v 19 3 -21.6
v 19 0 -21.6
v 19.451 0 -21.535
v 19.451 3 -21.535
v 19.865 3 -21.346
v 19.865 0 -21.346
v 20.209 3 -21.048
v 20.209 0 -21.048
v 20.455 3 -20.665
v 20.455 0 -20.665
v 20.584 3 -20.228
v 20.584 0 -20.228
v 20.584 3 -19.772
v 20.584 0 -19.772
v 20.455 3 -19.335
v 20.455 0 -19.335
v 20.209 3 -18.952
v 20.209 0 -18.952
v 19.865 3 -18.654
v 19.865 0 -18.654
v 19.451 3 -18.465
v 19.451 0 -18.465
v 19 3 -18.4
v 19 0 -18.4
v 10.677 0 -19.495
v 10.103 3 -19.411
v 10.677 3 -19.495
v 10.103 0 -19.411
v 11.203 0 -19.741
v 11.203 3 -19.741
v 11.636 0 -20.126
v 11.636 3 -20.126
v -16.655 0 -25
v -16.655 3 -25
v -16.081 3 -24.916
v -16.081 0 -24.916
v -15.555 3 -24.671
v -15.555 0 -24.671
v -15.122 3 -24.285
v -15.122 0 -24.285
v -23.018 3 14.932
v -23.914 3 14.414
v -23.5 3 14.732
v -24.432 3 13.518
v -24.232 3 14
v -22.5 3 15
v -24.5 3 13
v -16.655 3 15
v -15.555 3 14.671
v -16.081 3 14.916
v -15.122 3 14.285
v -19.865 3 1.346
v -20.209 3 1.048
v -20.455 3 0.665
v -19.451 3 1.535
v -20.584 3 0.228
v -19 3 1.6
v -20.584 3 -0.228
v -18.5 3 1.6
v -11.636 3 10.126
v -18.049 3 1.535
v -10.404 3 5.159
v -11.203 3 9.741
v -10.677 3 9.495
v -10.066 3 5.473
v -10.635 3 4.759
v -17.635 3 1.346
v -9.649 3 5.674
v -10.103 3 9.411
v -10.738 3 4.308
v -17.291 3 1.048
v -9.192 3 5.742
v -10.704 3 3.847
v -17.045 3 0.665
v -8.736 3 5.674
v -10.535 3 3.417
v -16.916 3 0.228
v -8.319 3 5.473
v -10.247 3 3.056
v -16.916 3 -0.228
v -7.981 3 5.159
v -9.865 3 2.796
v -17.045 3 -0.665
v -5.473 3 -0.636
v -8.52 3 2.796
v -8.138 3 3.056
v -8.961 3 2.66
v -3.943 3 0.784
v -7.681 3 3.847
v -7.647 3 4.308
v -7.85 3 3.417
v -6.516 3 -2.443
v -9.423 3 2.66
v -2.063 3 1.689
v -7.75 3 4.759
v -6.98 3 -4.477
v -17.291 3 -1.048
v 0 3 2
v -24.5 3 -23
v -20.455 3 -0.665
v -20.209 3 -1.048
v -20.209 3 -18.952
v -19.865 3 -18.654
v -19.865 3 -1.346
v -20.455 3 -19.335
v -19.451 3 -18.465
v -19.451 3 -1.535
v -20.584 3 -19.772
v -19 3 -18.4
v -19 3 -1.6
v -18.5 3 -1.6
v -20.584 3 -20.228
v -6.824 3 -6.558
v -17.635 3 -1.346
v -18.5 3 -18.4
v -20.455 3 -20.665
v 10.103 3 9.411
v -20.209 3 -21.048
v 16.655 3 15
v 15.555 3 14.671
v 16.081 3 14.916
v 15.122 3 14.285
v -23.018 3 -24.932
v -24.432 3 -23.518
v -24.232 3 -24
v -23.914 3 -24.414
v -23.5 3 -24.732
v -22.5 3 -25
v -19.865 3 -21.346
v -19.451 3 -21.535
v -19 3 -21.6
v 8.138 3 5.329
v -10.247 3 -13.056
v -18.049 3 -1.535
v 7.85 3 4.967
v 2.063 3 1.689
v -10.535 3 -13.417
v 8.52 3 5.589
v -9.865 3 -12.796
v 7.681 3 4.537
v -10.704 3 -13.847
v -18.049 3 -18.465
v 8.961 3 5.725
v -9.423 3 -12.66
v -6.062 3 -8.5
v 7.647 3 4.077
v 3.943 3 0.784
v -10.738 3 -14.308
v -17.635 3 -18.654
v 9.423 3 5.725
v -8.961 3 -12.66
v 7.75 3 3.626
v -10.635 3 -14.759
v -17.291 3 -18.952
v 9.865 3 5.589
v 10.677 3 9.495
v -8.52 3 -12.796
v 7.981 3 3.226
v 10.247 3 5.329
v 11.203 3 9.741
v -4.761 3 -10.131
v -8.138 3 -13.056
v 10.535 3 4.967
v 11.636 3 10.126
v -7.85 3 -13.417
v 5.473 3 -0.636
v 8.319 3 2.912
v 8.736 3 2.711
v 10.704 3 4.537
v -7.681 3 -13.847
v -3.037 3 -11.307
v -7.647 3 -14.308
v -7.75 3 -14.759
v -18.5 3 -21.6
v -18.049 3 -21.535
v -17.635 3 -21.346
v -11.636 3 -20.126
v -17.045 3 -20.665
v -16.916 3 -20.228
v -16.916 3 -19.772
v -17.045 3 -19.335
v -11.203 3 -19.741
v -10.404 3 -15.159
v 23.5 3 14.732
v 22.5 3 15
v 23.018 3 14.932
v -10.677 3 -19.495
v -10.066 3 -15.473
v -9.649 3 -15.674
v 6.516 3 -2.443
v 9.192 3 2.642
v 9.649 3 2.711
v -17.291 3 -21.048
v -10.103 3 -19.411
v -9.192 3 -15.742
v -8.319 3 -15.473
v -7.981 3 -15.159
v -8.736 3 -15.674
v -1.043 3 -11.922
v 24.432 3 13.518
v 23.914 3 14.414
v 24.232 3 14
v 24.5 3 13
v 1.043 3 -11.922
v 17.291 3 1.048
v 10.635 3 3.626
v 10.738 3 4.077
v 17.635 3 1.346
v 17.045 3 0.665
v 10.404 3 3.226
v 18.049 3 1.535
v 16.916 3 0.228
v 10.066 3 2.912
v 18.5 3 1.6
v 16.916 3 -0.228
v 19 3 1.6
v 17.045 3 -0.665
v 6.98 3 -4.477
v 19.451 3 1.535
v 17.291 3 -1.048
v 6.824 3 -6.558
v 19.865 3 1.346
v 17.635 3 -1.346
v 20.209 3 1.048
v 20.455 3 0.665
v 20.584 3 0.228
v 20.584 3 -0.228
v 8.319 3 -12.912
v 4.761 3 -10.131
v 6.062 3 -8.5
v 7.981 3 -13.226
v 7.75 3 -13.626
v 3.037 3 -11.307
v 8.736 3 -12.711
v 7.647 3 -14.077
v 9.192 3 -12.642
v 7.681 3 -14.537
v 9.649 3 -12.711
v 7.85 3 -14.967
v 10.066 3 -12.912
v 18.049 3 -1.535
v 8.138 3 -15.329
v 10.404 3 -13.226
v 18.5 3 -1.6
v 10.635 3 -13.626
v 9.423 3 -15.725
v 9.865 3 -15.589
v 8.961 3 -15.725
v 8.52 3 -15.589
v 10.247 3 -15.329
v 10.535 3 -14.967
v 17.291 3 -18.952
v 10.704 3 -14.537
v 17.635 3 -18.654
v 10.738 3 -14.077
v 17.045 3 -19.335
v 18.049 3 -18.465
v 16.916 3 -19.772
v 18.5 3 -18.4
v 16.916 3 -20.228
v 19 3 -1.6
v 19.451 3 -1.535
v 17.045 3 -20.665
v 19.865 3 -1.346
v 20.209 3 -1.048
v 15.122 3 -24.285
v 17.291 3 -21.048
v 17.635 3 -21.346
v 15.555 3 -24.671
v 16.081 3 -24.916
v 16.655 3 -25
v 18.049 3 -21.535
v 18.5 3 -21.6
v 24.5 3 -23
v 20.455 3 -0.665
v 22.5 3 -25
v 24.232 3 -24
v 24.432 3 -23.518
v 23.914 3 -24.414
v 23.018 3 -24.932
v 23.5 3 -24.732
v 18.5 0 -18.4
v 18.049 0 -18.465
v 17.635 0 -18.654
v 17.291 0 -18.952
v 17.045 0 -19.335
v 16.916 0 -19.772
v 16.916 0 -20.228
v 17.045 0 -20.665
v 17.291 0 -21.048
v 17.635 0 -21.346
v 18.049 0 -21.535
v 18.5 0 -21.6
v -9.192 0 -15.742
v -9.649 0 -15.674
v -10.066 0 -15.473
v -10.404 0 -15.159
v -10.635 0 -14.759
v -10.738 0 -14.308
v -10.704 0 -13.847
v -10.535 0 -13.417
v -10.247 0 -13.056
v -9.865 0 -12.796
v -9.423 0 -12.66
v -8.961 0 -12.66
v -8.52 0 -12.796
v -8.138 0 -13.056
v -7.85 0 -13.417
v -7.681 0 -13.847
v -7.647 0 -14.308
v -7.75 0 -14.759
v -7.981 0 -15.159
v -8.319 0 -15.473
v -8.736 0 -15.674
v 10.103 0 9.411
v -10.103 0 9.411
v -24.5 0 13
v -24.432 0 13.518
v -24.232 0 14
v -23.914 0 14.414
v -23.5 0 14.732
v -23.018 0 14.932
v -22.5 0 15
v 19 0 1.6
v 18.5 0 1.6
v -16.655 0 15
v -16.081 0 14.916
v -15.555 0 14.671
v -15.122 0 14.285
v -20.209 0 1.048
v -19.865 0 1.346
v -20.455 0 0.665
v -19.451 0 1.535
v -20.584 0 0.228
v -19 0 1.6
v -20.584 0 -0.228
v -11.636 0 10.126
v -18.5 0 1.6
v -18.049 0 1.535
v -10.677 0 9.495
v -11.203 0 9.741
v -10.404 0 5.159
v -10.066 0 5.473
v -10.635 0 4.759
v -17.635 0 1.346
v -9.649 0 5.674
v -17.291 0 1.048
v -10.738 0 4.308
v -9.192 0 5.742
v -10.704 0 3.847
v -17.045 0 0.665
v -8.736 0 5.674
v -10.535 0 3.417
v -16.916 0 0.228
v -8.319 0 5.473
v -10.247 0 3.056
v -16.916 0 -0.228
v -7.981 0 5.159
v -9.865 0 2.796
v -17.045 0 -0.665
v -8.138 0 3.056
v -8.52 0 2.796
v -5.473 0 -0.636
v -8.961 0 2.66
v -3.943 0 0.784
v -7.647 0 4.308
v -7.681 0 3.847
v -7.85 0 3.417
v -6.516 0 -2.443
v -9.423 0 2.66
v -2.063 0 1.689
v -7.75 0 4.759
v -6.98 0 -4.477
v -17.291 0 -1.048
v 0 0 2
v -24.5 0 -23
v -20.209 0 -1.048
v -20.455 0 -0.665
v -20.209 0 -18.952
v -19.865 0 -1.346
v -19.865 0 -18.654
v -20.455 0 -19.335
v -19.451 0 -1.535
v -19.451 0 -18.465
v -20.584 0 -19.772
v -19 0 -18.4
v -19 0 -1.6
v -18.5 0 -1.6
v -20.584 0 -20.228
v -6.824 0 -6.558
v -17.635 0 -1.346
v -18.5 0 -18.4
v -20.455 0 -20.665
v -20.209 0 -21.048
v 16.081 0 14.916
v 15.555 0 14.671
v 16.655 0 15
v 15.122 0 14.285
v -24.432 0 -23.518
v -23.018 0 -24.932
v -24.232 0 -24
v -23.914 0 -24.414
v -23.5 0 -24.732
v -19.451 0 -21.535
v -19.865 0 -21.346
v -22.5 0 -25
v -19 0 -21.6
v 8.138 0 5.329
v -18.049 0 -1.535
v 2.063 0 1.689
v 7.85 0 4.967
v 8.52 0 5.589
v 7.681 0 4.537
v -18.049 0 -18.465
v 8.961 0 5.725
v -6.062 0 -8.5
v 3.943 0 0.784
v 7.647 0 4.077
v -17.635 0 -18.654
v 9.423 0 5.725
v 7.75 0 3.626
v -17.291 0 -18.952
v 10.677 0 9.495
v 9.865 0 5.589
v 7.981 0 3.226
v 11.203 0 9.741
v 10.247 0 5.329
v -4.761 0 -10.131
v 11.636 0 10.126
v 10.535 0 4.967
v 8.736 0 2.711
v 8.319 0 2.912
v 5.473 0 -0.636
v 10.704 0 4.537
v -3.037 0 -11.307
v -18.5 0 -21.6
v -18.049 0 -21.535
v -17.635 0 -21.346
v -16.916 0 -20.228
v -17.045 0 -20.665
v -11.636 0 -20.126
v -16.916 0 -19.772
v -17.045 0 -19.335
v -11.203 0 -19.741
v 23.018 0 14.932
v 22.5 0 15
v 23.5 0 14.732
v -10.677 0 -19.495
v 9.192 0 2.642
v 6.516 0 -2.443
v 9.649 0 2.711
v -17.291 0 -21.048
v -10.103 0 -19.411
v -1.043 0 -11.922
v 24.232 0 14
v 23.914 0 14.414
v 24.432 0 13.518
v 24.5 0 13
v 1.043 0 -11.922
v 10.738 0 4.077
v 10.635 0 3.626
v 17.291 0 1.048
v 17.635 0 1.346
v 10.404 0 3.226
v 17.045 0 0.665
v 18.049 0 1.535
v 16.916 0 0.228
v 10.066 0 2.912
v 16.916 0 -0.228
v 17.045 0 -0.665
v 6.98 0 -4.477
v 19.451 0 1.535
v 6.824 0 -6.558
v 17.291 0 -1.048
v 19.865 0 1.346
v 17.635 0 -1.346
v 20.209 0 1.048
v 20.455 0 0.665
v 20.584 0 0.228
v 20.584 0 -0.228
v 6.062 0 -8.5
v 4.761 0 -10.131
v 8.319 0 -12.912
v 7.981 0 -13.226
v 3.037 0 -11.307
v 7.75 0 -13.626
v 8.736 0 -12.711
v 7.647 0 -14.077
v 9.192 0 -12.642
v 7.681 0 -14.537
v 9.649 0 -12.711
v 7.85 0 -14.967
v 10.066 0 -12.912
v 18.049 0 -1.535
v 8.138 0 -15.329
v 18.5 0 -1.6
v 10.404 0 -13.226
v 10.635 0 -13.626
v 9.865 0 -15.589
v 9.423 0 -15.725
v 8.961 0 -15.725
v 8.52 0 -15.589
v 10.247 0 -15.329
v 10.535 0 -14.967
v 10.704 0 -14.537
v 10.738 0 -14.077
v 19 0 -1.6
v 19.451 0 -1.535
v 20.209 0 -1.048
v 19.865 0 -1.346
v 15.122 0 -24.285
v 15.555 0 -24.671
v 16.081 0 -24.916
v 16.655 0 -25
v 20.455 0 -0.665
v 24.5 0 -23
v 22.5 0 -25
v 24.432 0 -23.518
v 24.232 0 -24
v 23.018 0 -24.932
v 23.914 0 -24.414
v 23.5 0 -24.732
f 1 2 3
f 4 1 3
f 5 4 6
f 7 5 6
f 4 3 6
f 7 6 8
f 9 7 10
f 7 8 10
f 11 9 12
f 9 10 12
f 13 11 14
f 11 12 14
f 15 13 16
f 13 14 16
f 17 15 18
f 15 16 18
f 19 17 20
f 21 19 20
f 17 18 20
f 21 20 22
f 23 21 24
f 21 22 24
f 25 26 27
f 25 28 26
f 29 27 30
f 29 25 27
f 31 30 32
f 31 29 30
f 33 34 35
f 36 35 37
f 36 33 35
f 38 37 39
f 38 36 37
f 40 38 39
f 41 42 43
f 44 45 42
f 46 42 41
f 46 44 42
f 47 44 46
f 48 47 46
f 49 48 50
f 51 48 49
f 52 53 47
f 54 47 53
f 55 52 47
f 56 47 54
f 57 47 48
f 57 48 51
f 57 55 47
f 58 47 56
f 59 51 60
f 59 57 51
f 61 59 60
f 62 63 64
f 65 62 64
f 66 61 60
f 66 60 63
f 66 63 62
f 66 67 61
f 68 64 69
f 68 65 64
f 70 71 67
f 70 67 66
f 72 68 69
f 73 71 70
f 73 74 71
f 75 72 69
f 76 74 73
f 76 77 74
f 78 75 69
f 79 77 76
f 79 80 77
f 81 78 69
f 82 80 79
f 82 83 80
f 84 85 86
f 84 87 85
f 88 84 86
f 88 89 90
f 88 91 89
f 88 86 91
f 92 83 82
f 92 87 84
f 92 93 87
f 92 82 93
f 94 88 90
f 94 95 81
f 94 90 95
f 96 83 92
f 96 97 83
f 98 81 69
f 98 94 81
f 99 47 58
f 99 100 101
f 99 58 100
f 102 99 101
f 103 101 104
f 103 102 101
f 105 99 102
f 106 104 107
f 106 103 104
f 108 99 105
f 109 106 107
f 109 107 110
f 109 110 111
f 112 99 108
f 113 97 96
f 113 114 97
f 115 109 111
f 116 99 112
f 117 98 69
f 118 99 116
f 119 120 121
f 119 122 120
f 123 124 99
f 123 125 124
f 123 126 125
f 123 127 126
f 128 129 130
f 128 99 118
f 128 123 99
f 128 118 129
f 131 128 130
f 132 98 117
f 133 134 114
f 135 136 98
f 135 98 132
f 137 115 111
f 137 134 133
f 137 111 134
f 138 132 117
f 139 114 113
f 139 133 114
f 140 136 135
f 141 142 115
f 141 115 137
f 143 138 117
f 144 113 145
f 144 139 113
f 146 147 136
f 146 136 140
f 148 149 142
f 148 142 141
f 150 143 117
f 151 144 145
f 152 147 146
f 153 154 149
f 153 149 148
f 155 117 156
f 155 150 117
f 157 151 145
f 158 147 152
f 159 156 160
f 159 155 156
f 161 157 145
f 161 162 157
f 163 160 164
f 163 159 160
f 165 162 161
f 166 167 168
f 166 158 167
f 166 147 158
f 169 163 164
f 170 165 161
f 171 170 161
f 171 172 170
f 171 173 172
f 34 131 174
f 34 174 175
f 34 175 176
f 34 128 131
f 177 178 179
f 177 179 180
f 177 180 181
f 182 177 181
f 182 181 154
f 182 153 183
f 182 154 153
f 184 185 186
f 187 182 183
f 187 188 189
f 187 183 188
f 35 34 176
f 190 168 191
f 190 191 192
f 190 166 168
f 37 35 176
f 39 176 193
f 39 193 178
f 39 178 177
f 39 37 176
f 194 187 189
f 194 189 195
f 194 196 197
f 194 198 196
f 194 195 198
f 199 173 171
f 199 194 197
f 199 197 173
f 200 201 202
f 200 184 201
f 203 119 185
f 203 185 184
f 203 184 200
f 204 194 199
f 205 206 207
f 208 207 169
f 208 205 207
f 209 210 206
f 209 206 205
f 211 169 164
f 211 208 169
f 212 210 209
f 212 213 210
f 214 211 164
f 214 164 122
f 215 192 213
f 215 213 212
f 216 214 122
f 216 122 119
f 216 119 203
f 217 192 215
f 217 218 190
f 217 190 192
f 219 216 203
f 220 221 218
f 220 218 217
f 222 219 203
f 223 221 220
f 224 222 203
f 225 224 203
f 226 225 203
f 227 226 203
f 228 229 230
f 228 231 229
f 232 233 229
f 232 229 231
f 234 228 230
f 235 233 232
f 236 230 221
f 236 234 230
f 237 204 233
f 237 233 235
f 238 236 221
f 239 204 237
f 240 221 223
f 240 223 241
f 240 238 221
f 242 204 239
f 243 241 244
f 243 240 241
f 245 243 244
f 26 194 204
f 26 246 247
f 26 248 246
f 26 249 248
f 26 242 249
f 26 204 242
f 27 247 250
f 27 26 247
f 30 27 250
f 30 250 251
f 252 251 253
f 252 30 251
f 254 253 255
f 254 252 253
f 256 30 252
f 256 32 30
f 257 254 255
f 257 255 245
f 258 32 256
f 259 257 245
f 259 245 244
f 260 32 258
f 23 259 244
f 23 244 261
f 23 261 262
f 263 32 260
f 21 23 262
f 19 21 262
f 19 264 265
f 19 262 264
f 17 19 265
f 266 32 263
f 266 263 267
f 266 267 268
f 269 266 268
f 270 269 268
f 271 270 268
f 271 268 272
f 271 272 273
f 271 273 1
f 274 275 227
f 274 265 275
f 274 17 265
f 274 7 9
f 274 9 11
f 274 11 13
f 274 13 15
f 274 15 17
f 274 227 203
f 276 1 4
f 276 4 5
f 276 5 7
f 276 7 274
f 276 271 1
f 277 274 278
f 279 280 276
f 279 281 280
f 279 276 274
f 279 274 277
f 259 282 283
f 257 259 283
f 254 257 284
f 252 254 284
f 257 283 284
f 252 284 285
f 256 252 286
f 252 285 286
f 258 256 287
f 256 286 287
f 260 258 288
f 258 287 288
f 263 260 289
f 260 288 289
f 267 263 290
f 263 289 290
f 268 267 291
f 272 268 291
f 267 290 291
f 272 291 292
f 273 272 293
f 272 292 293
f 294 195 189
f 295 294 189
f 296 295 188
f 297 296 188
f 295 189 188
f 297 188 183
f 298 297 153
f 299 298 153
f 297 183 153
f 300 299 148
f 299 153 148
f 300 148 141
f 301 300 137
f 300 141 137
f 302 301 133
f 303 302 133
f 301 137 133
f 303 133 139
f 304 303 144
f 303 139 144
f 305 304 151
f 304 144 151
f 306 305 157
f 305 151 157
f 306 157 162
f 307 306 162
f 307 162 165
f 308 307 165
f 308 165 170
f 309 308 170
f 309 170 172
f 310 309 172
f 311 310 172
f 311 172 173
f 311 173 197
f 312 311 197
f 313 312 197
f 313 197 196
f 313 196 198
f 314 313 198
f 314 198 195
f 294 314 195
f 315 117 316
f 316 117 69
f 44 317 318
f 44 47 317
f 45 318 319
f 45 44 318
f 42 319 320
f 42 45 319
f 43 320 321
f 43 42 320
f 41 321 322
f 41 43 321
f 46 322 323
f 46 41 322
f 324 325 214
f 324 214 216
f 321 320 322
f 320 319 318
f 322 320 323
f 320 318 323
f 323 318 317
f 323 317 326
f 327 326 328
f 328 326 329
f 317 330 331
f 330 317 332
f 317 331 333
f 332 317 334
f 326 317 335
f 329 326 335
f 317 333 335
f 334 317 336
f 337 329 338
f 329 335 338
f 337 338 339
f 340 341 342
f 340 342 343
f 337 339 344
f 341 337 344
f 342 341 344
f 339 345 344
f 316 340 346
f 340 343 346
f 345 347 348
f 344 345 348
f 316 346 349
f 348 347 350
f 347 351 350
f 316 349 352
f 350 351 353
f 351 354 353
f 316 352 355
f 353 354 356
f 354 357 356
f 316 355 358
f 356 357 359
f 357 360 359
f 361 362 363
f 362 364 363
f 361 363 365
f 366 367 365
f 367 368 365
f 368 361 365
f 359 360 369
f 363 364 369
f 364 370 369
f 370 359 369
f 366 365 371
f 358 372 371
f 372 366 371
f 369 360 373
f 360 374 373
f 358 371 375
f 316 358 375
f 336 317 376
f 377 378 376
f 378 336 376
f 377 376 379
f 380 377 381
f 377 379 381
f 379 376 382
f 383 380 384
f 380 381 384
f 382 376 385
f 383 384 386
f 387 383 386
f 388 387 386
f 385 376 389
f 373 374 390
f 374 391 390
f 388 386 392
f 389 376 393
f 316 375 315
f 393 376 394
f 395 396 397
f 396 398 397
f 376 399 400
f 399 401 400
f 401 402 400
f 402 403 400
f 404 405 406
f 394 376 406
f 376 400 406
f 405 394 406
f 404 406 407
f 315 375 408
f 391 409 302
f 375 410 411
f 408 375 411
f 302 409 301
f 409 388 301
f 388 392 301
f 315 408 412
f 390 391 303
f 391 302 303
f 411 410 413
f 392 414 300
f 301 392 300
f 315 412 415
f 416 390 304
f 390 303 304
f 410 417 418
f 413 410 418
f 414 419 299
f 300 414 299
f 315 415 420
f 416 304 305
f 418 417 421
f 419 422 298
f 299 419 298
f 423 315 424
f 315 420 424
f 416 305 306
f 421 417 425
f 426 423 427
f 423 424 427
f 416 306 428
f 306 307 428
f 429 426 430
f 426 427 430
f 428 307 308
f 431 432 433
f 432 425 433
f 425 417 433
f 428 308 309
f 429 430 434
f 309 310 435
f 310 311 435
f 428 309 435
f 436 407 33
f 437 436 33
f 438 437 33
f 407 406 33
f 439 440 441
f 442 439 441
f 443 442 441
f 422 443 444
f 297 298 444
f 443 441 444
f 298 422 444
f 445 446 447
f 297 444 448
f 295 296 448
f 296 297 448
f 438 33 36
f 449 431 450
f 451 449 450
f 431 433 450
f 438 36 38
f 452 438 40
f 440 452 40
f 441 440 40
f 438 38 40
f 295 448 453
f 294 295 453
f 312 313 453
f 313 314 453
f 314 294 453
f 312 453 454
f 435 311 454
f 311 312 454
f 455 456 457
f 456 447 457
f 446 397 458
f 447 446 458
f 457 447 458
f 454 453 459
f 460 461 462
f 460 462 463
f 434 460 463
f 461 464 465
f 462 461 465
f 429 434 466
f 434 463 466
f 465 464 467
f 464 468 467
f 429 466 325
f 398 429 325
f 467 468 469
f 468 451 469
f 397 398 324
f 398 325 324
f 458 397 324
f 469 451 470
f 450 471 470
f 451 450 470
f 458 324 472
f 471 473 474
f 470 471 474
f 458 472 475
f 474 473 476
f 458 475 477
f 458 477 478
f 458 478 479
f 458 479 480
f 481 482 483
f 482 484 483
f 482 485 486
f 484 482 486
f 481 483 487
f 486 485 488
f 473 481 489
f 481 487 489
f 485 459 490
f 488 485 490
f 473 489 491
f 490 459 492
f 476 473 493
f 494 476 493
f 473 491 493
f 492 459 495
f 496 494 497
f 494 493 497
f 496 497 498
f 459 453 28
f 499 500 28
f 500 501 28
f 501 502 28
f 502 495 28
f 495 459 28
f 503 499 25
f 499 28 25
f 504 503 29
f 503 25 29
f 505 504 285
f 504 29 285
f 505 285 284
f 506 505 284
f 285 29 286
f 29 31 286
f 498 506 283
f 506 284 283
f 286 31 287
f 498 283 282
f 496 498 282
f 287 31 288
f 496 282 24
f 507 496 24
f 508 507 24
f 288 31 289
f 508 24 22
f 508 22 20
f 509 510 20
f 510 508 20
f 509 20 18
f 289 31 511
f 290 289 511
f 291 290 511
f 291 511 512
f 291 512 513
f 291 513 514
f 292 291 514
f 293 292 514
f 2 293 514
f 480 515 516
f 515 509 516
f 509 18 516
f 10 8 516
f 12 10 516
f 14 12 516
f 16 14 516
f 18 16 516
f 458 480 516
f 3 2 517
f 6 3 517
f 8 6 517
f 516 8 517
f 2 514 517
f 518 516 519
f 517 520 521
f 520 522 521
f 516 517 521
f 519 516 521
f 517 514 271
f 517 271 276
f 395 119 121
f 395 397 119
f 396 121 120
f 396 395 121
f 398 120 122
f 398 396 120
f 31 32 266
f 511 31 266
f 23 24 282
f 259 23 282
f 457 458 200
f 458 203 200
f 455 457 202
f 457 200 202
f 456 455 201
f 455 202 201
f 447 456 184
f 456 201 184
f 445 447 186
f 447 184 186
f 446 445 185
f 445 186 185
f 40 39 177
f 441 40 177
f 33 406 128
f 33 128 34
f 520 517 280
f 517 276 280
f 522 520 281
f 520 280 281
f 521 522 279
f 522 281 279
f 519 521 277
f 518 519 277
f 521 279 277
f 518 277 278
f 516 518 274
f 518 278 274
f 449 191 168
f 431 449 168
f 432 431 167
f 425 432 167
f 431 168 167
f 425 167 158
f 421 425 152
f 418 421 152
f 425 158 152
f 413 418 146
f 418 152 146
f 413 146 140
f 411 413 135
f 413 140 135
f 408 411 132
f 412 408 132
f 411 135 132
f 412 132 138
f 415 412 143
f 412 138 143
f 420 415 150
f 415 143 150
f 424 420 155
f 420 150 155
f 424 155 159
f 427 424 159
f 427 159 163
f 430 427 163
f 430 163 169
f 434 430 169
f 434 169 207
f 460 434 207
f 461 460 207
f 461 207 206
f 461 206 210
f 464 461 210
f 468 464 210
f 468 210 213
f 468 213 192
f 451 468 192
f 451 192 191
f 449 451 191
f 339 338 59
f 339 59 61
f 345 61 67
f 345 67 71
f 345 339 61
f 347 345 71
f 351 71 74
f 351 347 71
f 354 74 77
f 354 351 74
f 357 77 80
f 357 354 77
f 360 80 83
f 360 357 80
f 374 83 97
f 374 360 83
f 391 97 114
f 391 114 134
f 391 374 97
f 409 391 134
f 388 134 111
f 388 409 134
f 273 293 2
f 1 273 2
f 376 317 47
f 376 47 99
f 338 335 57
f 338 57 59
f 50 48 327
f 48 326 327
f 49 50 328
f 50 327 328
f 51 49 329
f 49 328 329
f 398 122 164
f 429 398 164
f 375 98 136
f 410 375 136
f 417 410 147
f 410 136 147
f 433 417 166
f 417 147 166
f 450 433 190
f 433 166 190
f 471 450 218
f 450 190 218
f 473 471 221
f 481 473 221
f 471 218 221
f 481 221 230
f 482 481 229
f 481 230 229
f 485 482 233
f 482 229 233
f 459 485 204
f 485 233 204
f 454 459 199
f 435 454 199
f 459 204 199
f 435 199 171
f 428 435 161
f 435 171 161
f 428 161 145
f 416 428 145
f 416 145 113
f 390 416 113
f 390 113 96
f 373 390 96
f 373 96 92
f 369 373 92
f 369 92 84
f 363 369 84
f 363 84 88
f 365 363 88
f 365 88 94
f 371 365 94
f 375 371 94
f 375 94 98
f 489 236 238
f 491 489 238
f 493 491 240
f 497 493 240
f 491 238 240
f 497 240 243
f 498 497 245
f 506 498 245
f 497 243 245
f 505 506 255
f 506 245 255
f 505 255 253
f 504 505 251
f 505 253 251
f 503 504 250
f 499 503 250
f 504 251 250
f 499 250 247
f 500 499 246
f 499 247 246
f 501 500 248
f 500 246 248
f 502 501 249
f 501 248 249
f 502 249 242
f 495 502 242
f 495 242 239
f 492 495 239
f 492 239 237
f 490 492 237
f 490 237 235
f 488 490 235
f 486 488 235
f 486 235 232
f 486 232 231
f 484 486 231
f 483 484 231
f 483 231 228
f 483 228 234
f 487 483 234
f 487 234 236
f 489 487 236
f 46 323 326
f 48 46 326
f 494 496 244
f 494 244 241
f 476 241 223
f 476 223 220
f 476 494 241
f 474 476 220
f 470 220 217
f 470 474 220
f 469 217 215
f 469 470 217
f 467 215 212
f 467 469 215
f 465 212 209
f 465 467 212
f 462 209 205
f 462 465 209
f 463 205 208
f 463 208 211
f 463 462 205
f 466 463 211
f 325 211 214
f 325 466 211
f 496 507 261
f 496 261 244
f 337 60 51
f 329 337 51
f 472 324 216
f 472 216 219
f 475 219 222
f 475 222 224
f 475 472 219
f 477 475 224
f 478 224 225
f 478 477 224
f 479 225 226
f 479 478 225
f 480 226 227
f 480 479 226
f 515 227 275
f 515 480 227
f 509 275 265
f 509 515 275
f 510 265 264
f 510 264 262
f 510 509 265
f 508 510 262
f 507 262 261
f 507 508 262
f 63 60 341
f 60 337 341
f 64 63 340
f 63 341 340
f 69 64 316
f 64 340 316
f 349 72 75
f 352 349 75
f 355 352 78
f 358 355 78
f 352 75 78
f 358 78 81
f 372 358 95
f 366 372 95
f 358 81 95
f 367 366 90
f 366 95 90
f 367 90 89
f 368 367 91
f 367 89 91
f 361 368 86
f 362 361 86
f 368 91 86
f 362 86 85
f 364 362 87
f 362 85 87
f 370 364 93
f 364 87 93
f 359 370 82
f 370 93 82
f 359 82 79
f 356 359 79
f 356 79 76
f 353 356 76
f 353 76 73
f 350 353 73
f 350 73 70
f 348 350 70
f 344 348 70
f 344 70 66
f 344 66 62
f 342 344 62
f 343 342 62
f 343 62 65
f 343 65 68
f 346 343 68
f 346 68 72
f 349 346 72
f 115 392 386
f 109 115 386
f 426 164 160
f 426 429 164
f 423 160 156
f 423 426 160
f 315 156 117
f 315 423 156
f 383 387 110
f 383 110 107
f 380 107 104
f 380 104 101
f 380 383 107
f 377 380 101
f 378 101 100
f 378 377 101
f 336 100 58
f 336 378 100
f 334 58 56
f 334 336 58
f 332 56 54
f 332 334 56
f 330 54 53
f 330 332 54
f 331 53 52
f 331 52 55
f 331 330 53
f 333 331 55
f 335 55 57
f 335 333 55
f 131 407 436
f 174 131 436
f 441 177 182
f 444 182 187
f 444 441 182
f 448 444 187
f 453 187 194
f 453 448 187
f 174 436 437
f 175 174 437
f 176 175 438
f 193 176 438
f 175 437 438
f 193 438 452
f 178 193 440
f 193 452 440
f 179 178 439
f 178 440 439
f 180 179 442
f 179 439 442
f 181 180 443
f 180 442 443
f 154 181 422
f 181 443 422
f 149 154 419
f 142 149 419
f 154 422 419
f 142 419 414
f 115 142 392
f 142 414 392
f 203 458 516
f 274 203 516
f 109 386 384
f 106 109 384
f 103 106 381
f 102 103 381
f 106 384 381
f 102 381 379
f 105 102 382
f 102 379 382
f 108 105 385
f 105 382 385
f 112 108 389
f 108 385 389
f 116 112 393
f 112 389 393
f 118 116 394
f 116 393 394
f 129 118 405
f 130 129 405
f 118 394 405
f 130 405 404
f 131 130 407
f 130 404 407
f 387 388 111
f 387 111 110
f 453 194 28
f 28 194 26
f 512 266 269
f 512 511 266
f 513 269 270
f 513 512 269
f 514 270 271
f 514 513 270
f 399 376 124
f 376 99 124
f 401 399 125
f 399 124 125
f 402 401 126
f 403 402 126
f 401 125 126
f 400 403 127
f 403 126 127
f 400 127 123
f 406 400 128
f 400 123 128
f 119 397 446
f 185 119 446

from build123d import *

# Parameters (mm, degrees)
SKETCH_1_W          = 49
SKETCH_1_H          = 40
EXTRUDE_1_DEPTH     = 3
SKETCH_2_R          = 1.55
SKETCH_2_R_2        = 7
CUT_EXTRUDE_1_DEPTH = 36.131894341
CUT_EXTRUDE_2_DEPTH = 36.131894341
FILLET_1_R          = 2


with BuildPart() as part:
    # 草图1 → 凸台-拉伸1 (new body)
    with BuildSketch(Plane(origin=(0, 0, 0), x_dir=(1, 0, 0), z_dir=(0, 1, 0))):
        with Locations((0, 5)):
            Rectangle(SKETCH_1_W, SKETCH_1_H)
        with BuildLine():
            Line((-19, 21.6), (-18.5, 21.6))
            ThreePointArc((-18.5, 21.6), (-16.9, 20), (-18.5, 18.4))
            Line((-18.5, 18.4), (-19, 18.4))
            ThreePointArc((-19, 18.4), (-20.6, 20), (-19, 21.6))
        make_face(mode=Mode.SUBTRACT)
        with BuildLine():
            Line((19, 18.4), (18.5, 18.4))
            ThreePointArc((18.5, 18.4), (16.9, 20), (18.5, 21.6))
            Line((18.5, 21.6), (19, 21.6))
            ThreePointArc((19, 21.6), (20.6, 20), (19, 18.4))
        make_face(mode=Mode.SUBTRACT)
        with BuildLine():
            Line((19, 1.6), (18.5, 1.6))
            ThreePointArc((18.5, 1.6), (16.9, 0), (18.5, -1.6))
            Line((18.5, -1.6), (19, -1.6))
            ThreePointArc((19, -1.6), (20.6, 0), (19, 1.6))
        make_face(mode=Mode.SUBTRACT)
        with BuildLine():
            Line((-19, -1.6), (-18.5, -1.6))
            ThreePointArc((-18.5, -1.6), (-16.9, 0), (-18.5, 1.6))
            Line((-18.5, 1.6), (-19, 1.6))
            ThreePointArc((-19, 1.6), (-20.6, 0), (-19, -1.6))
        make_face(mode=Mode.SUBTRACT)
    extrude(amount=EXTRUDE_1_DEPTH)

    # 草图2 → 切除-拉伸1 (cut, through all)
    with BuildSketch(Plane(origin=(0, 3, 0), x_dir=(1, 0, 0), z_dir=(0, 1, 0))):
        with Locations(Location((9.192388155, 14.192388155, 0), (0, 0, 270))):
            Circle(SKETCH_2_R)
        with Locations(Location((9.192388155, -4.192388155, 0), (0, 0, 90))):
            Circle(SKETCH_2_R)
        with Locations(Location((-9.192388155, 14.192388155, 0), (0, 0, 90))):
            Circle(SKETCH_2_R)
        with Locations(Location((-9.192388155, -4.192388155, 0), (0, 0, 270))):
            Circle(SKETCH_2_R)
        with Locations(Location((0, 5, 0), (0, 0, 270))):
            Circle(SKETCH_2_R_2)
    extrude(amount=-CUT_EXTRUDE_1_DEPTH, mode=Mode.SUBTRACT)

    # 草图3 → 切除-拉伸2 (cut, through all)
    with BuildSketch(Plane(origin=(0, 3, 0), x_dir=(1, 0, 0), z_dir=(0, 1, 0))):
        Polygon((-15.721322439, 25), (-11.036685955, 19.411212236), (11.036685955, 19.411212236), (15.721322439, 25), align=None)
        Polygon((15.721322439, -15), (11.036685955, -9.411212236), (-11.036685955, -9.411212236), (-15.721322439, -15), align=None)
    extrude(amount=-CUT_EXTRUDE_2_DEPTH, mode=Mode.SUBTRACT)

    # 圆角1
    fillet_1_edges = [part.edges().sort_by_distance(p)[0] for p in [
        (-15.721322439, 1.5, -25),
        (15.721322439, 1.5, -25),
        (11.036685955, 1.5, -19.411212236),
        (-11.036685955, 1.5, -19.411212236),
        (15.721322439, 1.5, 15),
        (-15.721322439, 1.5, 15),
        (-11.036685955, 1.5, 9.411212236),
        (11.036685955, 1.5, 9.411212236),
        (24.5, 1.5, 15),
        (-24.5, 1.5, 15),
        (-24.5, 1.5, -25),
        (24.5, 1.5, -25),
    ]]
    fillet(fillet_1_edges, radius=FILLET_1_R)


solid = part.part
